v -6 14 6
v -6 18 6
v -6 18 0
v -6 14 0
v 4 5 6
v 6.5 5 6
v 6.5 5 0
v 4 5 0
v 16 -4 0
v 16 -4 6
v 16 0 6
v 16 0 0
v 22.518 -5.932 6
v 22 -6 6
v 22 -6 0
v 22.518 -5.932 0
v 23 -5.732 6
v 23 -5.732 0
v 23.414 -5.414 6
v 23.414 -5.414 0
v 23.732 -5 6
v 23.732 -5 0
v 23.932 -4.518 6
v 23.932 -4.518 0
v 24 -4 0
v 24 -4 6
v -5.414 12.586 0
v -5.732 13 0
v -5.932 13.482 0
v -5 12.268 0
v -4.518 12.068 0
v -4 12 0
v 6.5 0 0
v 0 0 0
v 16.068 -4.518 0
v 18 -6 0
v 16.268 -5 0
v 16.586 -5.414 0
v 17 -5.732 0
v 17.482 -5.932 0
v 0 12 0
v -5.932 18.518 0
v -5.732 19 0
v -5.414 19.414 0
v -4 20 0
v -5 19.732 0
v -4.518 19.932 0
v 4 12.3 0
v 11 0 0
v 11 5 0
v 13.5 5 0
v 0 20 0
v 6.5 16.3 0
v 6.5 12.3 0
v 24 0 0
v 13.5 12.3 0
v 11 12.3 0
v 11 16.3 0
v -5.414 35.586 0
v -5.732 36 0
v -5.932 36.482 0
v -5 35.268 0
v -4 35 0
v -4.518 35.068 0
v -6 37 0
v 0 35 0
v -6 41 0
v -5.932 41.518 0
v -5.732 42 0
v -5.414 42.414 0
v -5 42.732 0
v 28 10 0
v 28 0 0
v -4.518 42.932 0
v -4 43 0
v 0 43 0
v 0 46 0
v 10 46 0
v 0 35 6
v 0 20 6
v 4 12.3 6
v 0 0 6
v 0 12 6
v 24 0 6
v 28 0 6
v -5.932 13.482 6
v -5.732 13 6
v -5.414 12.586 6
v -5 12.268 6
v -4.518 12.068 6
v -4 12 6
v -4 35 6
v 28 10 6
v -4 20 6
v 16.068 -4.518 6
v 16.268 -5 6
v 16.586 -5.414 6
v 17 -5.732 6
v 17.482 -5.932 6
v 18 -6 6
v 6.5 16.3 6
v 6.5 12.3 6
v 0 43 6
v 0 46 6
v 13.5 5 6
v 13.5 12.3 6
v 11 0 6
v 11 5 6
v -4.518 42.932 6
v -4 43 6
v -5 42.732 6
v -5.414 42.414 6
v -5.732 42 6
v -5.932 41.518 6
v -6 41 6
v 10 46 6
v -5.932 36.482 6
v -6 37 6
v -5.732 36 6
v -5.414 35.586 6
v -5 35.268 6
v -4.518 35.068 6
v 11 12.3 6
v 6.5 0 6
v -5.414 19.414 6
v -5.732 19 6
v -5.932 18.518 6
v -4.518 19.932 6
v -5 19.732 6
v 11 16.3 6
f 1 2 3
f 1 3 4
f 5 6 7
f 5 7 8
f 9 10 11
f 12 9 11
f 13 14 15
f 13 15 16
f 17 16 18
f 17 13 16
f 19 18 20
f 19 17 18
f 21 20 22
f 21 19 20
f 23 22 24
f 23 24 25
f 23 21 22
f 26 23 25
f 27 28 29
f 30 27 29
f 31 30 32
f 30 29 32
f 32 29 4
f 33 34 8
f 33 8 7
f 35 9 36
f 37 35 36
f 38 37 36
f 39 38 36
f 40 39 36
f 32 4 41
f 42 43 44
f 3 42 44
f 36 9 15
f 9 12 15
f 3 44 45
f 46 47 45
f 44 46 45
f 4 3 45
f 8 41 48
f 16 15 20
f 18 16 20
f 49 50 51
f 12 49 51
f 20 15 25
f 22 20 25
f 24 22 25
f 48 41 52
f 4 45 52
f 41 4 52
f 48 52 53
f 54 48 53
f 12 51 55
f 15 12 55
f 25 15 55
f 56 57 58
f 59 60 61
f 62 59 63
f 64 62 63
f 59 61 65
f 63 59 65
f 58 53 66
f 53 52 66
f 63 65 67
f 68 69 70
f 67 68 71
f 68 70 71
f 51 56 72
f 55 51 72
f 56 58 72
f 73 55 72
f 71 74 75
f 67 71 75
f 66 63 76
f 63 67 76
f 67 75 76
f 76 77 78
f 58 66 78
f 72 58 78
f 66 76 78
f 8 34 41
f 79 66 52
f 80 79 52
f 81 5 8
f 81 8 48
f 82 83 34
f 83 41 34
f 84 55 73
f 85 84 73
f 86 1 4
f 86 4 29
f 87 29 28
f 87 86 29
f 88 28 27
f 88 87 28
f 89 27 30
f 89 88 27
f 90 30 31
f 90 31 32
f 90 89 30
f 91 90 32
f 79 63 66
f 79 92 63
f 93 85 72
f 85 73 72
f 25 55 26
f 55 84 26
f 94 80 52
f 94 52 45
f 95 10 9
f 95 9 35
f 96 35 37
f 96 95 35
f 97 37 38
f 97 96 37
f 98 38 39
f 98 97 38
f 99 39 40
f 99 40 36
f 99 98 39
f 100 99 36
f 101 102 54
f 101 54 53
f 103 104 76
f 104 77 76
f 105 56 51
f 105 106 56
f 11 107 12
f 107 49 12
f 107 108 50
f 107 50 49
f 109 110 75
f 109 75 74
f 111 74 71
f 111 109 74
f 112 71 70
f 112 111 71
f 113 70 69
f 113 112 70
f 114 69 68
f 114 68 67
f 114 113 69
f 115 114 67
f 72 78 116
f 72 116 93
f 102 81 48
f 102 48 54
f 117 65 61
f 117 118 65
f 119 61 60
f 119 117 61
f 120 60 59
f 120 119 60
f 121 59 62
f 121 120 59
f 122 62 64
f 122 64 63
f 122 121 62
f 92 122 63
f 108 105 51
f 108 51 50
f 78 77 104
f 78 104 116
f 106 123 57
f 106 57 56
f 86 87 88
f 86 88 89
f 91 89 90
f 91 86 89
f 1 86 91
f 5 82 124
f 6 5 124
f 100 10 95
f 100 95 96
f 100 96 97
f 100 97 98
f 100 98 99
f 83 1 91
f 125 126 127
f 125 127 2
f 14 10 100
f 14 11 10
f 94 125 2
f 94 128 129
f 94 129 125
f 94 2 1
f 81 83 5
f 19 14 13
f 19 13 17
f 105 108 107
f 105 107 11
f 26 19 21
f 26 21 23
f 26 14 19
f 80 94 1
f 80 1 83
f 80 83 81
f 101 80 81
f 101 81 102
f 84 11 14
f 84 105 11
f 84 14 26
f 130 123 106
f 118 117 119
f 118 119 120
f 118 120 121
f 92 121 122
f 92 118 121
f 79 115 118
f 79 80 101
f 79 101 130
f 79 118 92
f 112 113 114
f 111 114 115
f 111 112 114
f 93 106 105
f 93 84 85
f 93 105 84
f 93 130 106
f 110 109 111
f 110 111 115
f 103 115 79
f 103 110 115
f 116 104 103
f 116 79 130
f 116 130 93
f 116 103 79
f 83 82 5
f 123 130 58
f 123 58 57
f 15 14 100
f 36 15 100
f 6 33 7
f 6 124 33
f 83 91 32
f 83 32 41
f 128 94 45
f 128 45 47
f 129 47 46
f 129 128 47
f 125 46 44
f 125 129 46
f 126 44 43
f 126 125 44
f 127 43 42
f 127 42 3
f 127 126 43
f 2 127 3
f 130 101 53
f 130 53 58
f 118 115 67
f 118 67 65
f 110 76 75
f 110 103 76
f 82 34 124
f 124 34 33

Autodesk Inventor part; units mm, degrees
ref_plane "YZ Plane" through (0, 0, 0) normal (1, 0, 0) x (0, 1, 0)
ref_plane "XZ Plane" through (0, 0, 0) normal (0, 1, 0) x (-1, 0, 0)
ref_plane "XY Plane" through (0, 0, 0) normal (0, 0, 1) x (1, 0, 0)
sketch "Sketch1" plane through (0, 0, 0) normal (0, 0, 1) x (1, 0, 0)
  line L0 (0, 46) -> (0, 0)
  line L1 (0, 0) -> (28, 0)
  line L2 (28, 0) -> (28, 10)
  line L3 (0, 46) -> (10, 46)
  line L4 (10, 46) -> (28, 10)
  dimension "d0" = 10
  dimension "d1" = 10
  dimension "d2" = 46
  dimension "d3" = 28
extrude "Extrusion1" add sketch "Sketch1" along normal blind 6
sketch "Sketch2" plane through (0, 0, 6) normal (0, 0, 1) x (1, 0, 0)
  line L0 (0, 46) -> (0, 0) projected
  line L1 (0, 0) -> (28, 0) projected
  line L2 (0, 43) -> (-4, 43)
  line L3 (-6, 41) -> (-6, 37)
  line L4 (-4, 35) -> (0, 35)
  line L5 (0, 35) -> (0, 43)
  line L6 (0, 20) -> (-4, 20)
  line L7 (-6, 18) -> (-6, 14)
  line L8 (-4, 12) -> (0, 12)
  line L9 (0, 12) -> (0, 20)
  line L10 (16, 0) -> (24, 0)
  line L11 (24, 0) -> (24, -4)
  line L12 (22, -6) -> (18, -6)
  line L13 (16, -4) -> (16, 0)
  arc A0 (-4, 43) -> (-6, 41) centre (-4, 41) ccw
  arc A1 (-6, 37) -> (-4, 35) centre (-4, 37) ccw
  arc A2 (-4, 20) -> (-6, 18) centre (-4, 18) ccw
  arc A3 (-6, 14) -> (-4, 12) centre (-4, 14) ccw
  arc A4 (16, -4) -> (18, -6) centre (18, -4) ccw
  arc A5 (22, -6) -> (24, -4) centre (22, -4) ccw
  line L14 (28, 0) -> (28, 10) projected
  point P0 (-6, 35)
  point P1 (-6, 43)
  point P2 (-6, 12)
  point P3 (-6, 20)
  point P4 (24, -6)
  point P5 (16, -6)
  dimension "d6" = 8
  dimension "d7" = 8
  dimension "d9" = 8
  dimension "d10" = 12
  dimension "d11" = 15
  dimension "d15" = 2
  dimension "d16" = 6
  dimension "d38" = 4
  dimension "d39" = 6
sketch "Sketch3" plane through (0, 0, 6) normal (0, 0, 1) x (1, 0, 0)
  line L0 (0, 0) -> (28, 0) projected
  line L1 (6.5, 0) -> (6.5, 5)
  line L2 (6.5, 5) -> (4, 5)
  line L3 (4, 5) -> (4, 12.3)
  line L4 (4, 12.3) -> (6.5, 12.3)
  line L5 (6.5, 12.3) -> (6.5, 16.3)
  line L6 (6.5, 16.3) -> (11, 16.3)
  line L7 (11, 16.3) -> (11, 12.3)
  line L8 (11, 12.3) -> (13.5, 12.3)
  line L9 (13.5, 12.3) -> (13.5, 5)
  line L10 (13.5, 5) -> (11, 5)
  line L11 (11, 5) -> (11, 0)
  line L12 (0, 46) -> (0, 0) projected
  point P0 (11, 0)
  point P1 (26, 0)
  point P2 (8.75, 16.3)
  dimension "d27" = 4.5
  dimension "d28" = 5
  dimension "d29" = 7.3
  dimension "d30" = 4
  dimension "d32" = 2.5
  dimension "d33" = 2.5
  dimension "d41" = 4
extrude "Extrusion4" cut sketch "Sketch3" against normal through all
extrude "Extrusion5" add sketch "Sketch2" against normal blind 6
properties part number "x_carryage_brace"
